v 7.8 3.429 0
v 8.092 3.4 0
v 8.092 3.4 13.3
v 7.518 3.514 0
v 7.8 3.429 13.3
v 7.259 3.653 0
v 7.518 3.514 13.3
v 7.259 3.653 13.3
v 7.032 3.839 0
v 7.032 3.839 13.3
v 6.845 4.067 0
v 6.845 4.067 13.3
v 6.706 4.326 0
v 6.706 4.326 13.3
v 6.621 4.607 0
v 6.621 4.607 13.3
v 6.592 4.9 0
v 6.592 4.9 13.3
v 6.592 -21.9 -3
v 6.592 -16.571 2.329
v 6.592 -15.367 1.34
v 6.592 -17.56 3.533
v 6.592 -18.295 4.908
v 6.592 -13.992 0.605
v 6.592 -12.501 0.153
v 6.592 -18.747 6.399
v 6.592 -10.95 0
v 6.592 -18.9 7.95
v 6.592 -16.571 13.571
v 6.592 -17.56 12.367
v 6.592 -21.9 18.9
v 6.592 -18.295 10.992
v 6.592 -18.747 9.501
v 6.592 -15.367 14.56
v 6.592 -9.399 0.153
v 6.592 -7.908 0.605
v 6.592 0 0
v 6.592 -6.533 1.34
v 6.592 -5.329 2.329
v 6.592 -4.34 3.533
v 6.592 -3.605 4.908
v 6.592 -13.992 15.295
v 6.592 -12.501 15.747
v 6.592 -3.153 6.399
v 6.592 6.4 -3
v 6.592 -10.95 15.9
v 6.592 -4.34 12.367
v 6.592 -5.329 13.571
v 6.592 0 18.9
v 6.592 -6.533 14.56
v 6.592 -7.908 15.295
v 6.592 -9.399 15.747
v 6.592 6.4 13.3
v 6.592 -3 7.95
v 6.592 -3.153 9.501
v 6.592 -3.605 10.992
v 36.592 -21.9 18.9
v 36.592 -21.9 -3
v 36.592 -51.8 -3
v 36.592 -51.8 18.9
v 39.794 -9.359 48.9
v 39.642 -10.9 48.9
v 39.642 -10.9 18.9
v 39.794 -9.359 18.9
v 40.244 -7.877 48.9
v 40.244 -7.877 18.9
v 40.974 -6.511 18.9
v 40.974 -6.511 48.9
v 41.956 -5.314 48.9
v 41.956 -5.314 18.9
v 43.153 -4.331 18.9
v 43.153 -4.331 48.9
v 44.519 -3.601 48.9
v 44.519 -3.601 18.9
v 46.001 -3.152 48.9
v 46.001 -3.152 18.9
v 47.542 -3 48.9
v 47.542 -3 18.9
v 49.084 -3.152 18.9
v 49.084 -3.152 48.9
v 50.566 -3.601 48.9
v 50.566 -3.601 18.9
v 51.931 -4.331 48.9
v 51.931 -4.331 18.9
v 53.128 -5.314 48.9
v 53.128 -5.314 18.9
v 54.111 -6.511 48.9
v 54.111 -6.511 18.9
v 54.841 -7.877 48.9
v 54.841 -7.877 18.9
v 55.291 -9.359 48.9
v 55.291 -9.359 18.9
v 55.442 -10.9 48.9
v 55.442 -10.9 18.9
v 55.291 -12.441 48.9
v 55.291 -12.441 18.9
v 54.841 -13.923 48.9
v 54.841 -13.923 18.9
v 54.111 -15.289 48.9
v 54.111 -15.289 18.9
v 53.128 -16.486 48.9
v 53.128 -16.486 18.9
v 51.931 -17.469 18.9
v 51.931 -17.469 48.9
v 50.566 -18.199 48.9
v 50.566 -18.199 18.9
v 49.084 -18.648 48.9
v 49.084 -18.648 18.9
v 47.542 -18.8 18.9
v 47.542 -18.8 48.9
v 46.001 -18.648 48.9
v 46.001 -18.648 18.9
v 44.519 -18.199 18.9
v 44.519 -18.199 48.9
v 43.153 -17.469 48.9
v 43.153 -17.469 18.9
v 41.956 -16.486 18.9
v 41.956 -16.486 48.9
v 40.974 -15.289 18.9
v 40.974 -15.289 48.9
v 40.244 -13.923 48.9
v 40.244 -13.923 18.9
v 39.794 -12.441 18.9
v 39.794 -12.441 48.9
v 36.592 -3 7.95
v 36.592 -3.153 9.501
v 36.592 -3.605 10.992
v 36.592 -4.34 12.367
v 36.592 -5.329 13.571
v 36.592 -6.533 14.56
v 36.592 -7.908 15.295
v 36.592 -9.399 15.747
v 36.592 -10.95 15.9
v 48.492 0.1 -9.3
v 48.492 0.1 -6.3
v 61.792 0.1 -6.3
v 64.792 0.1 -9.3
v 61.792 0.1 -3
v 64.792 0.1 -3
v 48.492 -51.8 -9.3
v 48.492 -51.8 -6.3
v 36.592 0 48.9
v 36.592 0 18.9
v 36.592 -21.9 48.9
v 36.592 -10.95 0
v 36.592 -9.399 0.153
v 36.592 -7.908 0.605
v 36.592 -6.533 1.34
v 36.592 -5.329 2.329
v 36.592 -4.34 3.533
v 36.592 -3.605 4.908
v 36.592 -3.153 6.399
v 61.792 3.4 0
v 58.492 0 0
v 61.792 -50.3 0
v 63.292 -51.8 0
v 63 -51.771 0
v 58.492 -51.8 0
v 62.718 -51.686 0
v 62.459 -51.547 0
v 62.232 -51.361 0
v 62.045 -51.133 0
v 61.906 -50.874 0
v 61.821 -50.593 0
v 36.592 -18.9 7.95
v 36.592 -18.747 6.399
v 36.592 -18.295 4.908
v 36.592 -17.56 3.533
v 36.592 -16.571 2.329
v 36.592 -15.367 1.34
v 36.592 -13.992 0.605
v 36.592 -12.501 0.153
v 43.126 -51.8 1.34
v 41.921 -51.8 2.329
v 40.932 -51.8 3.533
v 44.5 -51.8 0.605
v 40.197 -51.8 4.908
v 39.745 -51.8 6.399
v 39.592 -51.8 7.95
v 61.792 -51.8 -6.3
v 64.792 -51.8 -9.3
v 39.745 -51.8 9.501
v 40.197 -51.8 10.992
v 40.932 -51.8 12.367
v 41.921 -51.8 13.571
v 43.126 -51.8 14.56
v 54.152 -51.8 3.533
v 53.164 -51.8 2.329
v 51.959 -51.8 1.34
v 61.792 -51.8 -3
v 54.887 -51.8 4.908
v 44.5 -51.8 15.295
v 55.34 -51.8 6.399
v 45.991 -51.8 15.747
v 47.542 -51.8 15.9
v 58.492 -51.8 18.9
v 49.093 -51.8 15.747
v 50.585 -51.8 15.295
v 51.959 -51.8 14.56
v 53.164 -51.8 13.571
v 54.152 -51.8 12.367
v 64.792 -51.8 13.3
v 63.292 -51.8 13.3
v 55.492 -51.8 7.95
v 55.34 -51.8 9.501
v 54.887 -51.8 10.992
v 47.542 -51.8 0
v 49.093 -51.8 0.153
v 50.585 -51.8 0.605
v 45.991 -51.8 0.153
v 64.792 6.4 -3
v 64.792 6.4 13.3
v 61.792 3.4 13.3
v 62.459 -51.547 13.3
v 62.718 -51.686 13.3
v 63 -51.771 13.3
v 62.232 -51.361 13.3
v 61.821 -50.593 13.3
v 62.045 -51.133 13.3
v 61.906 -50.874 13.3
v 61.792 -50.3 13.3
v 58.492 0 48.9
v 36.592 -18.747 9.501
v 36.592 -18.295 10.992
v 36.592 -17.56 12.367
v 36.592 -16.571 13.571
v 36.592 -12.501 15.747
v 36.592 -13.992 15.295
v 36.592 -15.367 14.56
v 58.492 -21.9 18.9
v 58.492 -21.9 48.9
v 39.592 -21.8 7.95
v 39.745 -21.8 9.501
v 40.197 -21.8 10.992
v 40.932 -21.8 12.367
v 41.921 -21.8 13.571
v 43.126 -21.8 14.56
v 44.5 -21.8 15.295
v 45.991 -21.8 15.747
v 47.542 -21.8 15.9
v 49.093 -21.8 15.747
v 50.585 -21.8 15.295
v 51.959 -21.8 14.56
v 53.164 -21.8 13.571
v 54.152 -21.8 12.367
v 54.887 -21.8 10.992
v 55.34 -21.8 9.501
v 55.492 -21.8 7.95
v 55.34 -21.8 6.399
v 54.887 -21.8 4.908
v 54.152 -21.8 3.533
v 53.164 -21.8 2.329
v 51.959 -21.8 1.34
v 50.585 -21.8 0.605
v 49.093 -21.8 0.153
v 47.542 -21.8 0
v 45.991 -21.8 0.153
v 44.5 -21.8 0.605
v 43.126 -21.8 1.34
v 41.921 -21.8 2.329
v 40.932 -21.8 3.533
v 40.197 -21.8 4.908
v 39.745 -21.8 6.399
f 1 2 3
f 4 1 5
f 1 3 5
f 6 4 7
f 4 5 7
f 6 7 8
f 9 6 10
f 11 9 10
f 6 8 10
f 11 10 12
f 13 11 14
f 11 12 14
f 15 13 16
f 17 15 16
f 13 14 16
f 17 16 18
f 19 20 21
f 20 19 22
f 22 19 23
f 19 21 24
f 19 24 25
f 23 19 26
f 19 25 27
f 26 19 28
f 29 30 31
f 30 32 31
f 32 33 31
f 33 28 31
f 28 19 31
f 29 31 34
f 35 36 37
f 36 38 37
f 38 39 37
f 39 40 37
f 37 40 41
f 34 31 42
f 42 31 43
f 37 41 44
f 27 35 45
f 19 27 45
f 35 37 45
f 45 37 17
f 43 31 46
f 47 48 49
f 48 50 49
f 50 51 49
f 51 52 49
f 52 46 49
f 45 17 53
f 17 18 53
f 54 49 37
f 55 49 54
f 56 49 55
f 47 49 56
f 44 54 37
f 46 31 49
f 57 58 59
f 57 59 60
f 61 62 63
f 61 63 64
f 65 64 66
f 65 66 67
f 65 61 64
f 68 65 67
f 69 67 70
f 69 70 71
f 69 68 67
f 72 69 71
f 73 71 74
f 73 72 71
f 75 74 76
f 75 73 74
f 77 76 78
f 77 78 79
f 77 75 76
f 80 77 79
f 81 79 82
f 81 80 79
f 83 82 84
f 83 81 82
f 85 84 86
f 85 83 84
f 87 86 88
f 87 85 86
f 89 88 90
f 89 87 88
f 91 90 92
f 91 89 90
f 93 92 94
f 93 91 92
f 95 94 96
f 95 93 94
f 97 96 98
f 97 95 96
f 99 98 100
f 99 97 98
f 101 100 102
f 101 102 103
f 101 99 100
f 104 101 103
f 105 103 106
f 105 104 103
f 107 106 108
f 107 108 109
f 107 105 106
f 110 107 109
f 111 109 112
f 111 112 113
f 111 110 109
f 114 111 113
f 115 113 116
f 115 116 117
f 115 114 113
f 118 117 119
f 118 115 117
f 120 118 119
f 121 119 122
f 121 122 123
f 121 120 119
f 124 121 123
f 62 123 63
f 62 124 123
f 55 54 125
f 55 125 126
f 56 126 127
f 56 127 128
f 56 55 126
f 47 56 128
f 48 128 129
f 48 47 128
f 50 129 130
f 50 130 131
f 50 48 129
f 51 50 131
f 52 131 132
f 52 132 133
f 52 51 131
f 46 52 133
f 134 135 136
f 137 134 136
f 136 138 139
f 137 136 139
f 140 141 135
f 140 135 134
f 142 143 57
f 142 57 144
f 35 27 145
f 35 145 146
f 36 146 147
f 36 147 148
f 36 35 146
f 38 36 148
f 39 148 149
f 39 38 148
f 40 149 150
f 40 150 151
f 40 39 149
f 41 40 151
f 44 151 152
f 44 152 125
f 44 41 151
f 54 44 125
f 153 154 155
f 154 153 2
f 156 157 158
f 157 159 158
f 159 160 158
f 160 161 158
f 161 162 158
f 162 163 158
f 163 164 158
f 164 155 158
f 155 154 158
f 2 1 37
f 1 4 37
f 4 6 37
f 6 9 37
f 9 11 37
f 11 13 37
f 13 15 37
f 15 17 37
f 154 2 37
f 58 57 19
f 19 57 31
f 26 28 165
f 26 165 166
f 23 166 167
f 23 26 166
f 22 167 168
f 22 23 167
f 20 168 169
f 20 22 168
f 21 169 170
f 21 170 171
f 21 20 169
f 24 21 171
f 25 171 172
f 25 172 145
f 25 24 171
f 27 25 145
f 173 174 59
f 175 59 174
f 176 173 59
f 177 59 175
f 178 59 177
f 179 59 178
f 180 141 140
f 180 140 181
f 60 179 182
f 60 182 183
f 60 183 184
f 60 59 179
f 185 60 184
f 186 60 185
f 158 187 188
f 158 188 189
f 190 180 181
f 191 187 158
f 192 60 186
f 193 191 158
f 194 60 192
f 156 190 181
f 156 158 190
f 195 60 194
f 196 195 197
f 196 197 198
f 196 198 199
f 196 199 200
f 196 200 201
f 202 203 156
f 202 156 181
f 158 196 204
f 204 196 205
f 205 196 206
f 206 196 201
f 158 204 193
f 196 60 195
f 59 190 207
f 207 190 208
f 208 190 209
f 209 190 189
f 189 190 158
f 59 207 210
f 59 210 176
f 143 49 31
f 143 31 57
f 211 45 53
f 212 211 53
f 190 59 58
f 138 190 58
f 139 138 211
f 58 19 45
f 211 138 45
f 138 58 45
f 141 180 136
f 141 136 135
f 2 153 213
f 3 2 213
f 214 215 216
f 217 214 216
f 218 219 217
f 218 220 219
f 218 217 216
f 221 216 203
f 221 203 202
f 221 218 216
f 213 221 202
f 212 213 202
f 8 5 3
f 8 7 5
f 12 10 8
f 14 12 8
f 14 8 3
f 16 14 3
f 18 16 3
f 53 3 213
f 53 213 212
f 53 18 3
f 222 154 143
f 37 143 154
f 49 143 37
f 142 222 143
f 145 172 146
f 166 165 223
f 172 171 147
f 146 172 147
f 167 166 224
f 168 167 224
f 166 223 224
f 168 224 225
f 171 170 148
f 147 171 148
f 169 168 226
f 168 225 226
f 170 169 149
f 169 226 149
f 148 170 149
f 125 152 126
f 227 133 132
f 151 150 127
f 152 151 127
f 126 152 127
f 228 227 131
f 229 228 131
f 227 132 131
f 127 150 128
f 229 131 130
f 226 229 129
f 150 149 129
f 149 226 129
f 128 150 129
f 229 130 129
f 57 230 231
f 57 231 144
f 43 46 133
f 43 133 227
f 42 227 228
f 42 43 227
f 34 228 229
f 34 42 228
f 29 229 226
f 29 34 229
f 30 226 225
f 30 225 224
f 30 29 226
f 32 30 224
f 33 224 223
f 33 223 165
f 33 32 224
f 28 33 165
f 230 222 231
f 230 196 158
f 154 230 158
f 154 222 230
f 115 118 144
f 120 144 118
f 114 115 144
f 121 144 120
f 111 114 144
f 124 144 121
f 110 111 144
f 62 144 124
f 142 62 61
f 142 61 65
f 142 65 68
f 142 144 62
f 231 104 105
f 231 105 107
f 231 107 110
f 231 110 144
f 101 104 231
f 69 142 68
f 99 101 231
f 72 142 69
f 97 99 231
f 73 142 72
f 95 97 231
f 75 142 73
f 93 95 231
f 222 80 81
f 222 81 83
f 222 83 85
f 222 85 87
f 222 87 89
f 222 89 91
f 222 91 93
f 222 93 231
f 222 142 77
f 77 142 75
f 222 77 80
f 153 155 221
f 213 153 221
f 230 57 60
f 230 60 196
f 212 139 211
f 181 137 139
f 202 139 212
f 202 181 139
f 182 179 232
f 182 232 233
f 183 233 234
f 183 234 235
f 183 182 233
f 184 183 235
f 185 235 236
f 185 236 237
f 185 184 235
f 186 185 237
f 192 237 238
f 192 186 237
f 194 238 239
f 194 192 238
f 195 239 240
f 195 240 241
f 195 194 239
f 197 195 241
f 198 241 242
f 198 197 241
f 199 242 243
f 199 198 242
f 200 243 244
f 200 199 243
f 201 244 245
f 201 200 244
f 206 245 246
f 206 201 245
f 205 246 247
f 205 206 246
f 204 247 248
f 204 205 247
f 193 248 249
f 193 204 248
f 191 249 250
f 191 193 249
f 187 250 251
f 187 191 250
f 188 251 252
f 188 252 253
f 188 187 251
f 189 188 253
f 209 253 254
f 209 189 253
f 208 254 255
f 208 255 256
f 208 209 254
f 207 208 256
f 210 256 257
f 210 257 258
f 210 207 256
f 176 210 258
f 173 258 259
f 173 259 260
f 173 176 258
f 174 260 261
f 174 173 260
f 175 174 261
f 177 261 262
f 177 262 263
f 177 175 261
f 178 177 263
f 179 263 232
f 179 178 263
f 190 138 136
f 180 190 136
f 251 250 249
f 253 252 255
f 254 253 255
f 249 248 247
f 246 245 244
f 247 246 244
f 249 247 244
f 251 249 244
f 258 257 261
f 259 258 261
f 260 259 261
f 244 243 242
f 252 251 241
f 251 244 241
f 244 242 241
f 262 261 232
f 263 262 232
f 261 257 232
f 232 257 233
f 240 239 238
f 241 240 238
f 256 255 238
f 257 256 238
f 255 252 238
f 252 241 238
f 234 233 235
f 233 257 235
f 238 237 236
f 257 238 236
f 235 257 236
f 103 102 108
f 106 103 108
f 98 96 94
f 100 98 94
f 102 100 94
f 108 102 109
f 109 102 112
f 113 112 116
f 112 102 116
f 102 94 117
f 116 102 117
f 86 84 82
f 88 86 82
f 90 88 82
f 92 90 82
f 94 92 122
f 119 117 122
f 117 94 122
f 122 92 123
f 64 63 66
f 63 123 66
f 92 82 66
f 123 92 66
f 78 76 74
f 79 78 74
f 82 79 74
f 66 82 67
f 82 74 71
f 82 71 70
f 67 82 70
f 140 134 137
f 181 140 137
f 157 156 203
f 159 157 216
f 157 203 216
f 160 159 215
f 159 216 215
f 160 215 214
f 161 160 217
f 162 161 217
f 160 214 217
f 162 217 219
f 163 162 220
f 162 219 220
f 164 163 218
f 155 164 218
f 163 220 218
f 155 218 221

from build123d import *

# Parameters (mm, degrees)
F0_W      = 27
F0_H      = 15.9
F0_W_2    = 15.9
F0_H_2    = 27
F0_W_3    = 3
F0_H_3    = 3
F1_DEPTH  = 21.9
F2_DEPTH  = 51.8
F3_R      = 7.95
F6_DEPTH  = 30
F7_DEPTH  = 30
F4_R      = 7.9
F8_DEPTH  = 30
F10_DEPTH = 58.2
F11_W     = 3
F11_H     = 13.3
F13_R     = 1.5
F17_DEPTH = 51.9


with BuildPart() as f1:
    # F0 (on Front) → F1 (new body)
    with BuildSketch(Plane.XZ):
        with BuildLine():
            Line((-34.3576915575, 15.9), (-42.3076915575, 15.9))
            Line((-42.3076915575, 15.9), (-42.3076915575, 7.9499999931))
            ThreePointArc((-42.3076915575, 7.9499999931), (-39.9791904704, 13.571498908), (-34.3576915575, 15.9))
        make_face()
        with BuildLine():
            ThreePointArc((-34.3576915575, 15.9), (-39.9791904704, 13.571498908), (-42.3076915575, 7.9499999931))
            ThreePointArc((-42.3076915575, 7.9499999931), (-39.9791904655, 2.3285010871), (-34.3576915575, 0))
            ThreePointArc((-34.3576915575, 0), (-28.7361926471, 2.3285010896), (-26.4076915575, 7.95))
            ThreePointArc((-26.4076915575, 7.95), (-28.7361926471, 13.5714989104), (-34.3576915575, 15.9))
        make_face()
        Polygon((-42.3076915575, 18.9), (-42.3076915575, 45.9), (-26.4076915575, 45.9), (-26.4076915575, 18.9), (-23.4076915575, 18.9), (-23.4076915575, 48.9), (-45.3076915575, 48.9), (-45.3076915575, 18.9), align=None)
        with Locations((-9.9076915575, 7.95)):
            Rectangle(F0_W, F0_H)
        with Locations((-34.3576915575, 32.4)):
            Rectangle(F0_W_2, F0_H_2)
        with BuildLine():
            ThreePointArc((-34.3576915575, 0), (-39.9791904655, 2.3285010871), (-42.3076915575, 7.9499999931))
            Line((-42.3076915575, 7.9499999931), (-42.3076915575, 0))
            Line((-42.3076915575, 0), (-34.3576915575, 0))
        make_face()
        with BuildLine():
            Line((-26.4076915575, 0), (-26.4076915575, 7.95))
            ThreePointArc((-26.4076915575, 7.95), (-28.7361926471, 2.3285010896), (-34.3576915575, 0))
            Line((-34.3576915575, 0), (-26.4076915575, 0))
        make_face()
        with BuildLine():
            Line((-26.4076915575, 7.95), (-26.4076915575, 15.9))
            Line((-26.4076915575, 15.9), (-34.3576915575, 15.9))
            ThreePointArc((-34.3576915575, 15.9), (-28.7361926471, 13.5714989104), (-26.4076915575, 7.95))
        make_face()
        Polygon((6.5923084425, 18.9), (-23.4076915575, 18.9), (-23.4076915575, 15.9), (3.5923084425, 15.9), (3.5923084425, 0), (-23.4076915575, 0), (-23.4076915575, -3), (6.5923084425, -3), align=None)
        Polygon((-26.4076915575, 18.9), (-42.3076915575, 18.9), (-42.3076915575, 15.9), (-34.3576915575, 15.9), (-26.4076915575, 15.9), align=None)
        Polygon((-23.4076915575, 15.9), (-26.4076915575, 15.9), (-26.4076915575, 7.95), (-26.4076915575, 0), (-23.4076915575, 0), align=None)
        Polygon((-42.3076915575, 15.9), (-42.3076915575, 18.9), (-45.3076915575, 18.9), (-45.3076915575, -3), (-23.4076915575, -3), (-23.4076915575, 0), (-26.4076915575, 0), (-34.3576915575, 0), (-42.3076915575, 0), (-42.3076915575, 7.9499999931), align=None)
        with Locations((-24.9076915575, 17.4)):
            Rectangle(F0_W_3, F0_H_3)
    extrude(amount=F1_DEPTH)

    # F0 (on Front) → F2 (join)
    with BuildSketch(Plane.XZ):
        Polygon((-42.3076915575, 15.9), (-42.3076915575, 18.9), (-45.3076915575, 18.9), (-45.3076915575, -3), (-23.4076915575, -3), (-23.4076915575, 0), (-26.4076915575, 0), (-34.3576915575, 0), (-42.3076915575, 0), (-42.3076915575, 7.9499999931), align=None)
        with BuildLine():
            ThreePointArc((-34.3576915575, 15.9), (-39.9791904704, 13.571498908), (-42.3076915575, 7.9499999931))
            ThreePointArc((-42.3076915575, 7.9499999931), (-39.9791904655, 2.3285010871), (-34.3576915575, 0))
            ThreePointArc((-34.3576915575, 0), (-28.7361926471, 2.3285010896), (-26.4076915575, 7.95))
            ThreePointArc((-26.4076915575, 7.95), (-28.7361926471, 13.5714989104), (-34.3576915575, 15.9))
        make_face()
        Polygon((-26.4076915575, 18.9), (-42.3076915575, 18.9), (-42.3076915575, 15.9), (-34.3576915575, 15.9), (-26.4076915575, 15.9), align=None)
        Polygon((-23.4076915575, 15.9), (-26.4076915575, 15.9), (-26.4076915575, 7.95), (-26.4076915575, 0), (-23.4076915575, 0), align=None)
        with Locations((-24.9076915575, 17.4)):
            Rectangle(F0_W_3, F0_H_3)
        with BuildLine():
            Line((-26.4076915575, 7.95), (-26.4076915575, 15.9))
            Line((-26.4076915575, 15.9), (-34.3576915575, 15.9))
            ThreePointArc((-34.3576915575, 15.9), (-28.7361926471, 13.5714989104), (-26.4076915575, 7.95))
        make_face()
        with BuildLine():
            Line((-34.3576915575, 15.9), (-42.3076915575, 15.9))
            Line((-42.3076915575, 15.9), (-42.3076915575, 7.9499999931))
            ThreePointArc((-42.3076915575, 7.9499999931), (-39.9791904704, 13.571498908), (-34.3576915575, 15.9))
        make_face()
        with BuildLine():
            ThreePointArc((-34.3576915575, 0), (-39.9791904655, 2.3285010871), (-42.3076915575, 7.9499999931))
            Line((-42.3076915575, 7.9499999931), (-42.3076915575, 0))
            Line((-42.3076915575, 0), (-34.3576915575, 0))
        make_face()
        with BuildLine():
            Line((-26.4076915575, 0), (-26.4076915575, 7.95))
            ThreePointArc((-26.4076915575, 7.95), (-28.7361926471, 2.3285010896), (-34.3576915575, 0))
            Line((-34.3576915575, 0), (-26.4076915575, 0))
        make_face()
    extrude(amount=F2_DEPTH)

    # F3 (on face) → F6 (cut)
    with BuildSketch(Plane.XZ.offset(51.8)):
        with Locations((-34.3576915575, 7.95)):
            Circle(F3_R)
    extrude(amount=-F6_DEPTH, mode=Mode.SUBTRACT)

    # F5 (on face) → F7 (cut)
    with BuildSketch(Plane.YZ.offset(6.5923084425)):
        with BuildLine():
            ThreePointArc((-3, 7.95), (-5.3285010896, 13.5714989104), (-10.95, 15.9))
            ThreePointArc((-10.95, 15.9), (-16.5714989104, 13.5714989104), (-18.9, 7.95))
            ThreePointArc((-18.9, 7.95), (-16.5714989104, 2.3285010896), (-10.95, 0))
            ThreePointArc((-10.95, 0), (-5.3285010896, 2.3285010896), (-3, 7.95))
        make_face()
    extrude(amount=-F7_DEPTH, mode=Mode.SUBTRACT)

    # F4 (on face) → F8 (cut)
    with BuildSketch(Plane.XY.offset(48.9)):
        with Locations((-34.3576915575, -10.9)):
            Circle(F4_R)
    extrude(amount=-F8_DEPTH, mode=Mode.SUBTRACT)

    # F9 (on face) → F10 (join)
    with BuildSketch(Plane.XZ.offset(51.8)):
        Polygon((-51.6076915575, -3), (-45.3076915575, -3), (-45.3076915575, 0), (-48.6076915575, 0), (-48.6076915575, 13.3), (-51.6076915575, 13.3), align=None)
    extrude(amount=-F10_DEPTH)

    # F11 (on face) → F12 (join, up to the next surface of F1)
    with BuildSketch(Plane.YZ.offset(6.5923084425)):
        Polygon((6.4, -3), (6.4, 0), (3.4, 0), (0, 0), (0, -3), align=None)
        with Locations((4.9, 6.65)):
            Rectangle(F11_W, F11_H)
    extrude(until=Until.NEXT, dir=(-1, 0, 0))

    # F13
    f13_edges = [f1.edges().sort_by_distance(p)[0] for p in [
        (6.592308, 3.4, 6.65),
        (-48.607692, -51.8, 6.65),
    ]]
    fillet(f13_edges, radius=F13_R)


with BuildPart() as f14_1:
    # F14: instance of F1
    add(f1.part.mirror(Plane(origin=(6.5923084425, -9.0672909783, 7.3023649608), x_dir=(0, 1, 0), z_dir=(1, 0, 0))))

    # F16 (on face) → F17 (join)
    with BuildSketch(Plane.XZ.offset(51.8)):
        Polygon((64.7923084425, -9.3), (64.7923084425, -3), (61.7923084425, -3), (61.7923084425, -6.3), (48.4923084425, -6.3), (48.4923084425, -9.3), align=None)
    extrude(amount=-F17_DEPTH)


solid = f14_1.part
